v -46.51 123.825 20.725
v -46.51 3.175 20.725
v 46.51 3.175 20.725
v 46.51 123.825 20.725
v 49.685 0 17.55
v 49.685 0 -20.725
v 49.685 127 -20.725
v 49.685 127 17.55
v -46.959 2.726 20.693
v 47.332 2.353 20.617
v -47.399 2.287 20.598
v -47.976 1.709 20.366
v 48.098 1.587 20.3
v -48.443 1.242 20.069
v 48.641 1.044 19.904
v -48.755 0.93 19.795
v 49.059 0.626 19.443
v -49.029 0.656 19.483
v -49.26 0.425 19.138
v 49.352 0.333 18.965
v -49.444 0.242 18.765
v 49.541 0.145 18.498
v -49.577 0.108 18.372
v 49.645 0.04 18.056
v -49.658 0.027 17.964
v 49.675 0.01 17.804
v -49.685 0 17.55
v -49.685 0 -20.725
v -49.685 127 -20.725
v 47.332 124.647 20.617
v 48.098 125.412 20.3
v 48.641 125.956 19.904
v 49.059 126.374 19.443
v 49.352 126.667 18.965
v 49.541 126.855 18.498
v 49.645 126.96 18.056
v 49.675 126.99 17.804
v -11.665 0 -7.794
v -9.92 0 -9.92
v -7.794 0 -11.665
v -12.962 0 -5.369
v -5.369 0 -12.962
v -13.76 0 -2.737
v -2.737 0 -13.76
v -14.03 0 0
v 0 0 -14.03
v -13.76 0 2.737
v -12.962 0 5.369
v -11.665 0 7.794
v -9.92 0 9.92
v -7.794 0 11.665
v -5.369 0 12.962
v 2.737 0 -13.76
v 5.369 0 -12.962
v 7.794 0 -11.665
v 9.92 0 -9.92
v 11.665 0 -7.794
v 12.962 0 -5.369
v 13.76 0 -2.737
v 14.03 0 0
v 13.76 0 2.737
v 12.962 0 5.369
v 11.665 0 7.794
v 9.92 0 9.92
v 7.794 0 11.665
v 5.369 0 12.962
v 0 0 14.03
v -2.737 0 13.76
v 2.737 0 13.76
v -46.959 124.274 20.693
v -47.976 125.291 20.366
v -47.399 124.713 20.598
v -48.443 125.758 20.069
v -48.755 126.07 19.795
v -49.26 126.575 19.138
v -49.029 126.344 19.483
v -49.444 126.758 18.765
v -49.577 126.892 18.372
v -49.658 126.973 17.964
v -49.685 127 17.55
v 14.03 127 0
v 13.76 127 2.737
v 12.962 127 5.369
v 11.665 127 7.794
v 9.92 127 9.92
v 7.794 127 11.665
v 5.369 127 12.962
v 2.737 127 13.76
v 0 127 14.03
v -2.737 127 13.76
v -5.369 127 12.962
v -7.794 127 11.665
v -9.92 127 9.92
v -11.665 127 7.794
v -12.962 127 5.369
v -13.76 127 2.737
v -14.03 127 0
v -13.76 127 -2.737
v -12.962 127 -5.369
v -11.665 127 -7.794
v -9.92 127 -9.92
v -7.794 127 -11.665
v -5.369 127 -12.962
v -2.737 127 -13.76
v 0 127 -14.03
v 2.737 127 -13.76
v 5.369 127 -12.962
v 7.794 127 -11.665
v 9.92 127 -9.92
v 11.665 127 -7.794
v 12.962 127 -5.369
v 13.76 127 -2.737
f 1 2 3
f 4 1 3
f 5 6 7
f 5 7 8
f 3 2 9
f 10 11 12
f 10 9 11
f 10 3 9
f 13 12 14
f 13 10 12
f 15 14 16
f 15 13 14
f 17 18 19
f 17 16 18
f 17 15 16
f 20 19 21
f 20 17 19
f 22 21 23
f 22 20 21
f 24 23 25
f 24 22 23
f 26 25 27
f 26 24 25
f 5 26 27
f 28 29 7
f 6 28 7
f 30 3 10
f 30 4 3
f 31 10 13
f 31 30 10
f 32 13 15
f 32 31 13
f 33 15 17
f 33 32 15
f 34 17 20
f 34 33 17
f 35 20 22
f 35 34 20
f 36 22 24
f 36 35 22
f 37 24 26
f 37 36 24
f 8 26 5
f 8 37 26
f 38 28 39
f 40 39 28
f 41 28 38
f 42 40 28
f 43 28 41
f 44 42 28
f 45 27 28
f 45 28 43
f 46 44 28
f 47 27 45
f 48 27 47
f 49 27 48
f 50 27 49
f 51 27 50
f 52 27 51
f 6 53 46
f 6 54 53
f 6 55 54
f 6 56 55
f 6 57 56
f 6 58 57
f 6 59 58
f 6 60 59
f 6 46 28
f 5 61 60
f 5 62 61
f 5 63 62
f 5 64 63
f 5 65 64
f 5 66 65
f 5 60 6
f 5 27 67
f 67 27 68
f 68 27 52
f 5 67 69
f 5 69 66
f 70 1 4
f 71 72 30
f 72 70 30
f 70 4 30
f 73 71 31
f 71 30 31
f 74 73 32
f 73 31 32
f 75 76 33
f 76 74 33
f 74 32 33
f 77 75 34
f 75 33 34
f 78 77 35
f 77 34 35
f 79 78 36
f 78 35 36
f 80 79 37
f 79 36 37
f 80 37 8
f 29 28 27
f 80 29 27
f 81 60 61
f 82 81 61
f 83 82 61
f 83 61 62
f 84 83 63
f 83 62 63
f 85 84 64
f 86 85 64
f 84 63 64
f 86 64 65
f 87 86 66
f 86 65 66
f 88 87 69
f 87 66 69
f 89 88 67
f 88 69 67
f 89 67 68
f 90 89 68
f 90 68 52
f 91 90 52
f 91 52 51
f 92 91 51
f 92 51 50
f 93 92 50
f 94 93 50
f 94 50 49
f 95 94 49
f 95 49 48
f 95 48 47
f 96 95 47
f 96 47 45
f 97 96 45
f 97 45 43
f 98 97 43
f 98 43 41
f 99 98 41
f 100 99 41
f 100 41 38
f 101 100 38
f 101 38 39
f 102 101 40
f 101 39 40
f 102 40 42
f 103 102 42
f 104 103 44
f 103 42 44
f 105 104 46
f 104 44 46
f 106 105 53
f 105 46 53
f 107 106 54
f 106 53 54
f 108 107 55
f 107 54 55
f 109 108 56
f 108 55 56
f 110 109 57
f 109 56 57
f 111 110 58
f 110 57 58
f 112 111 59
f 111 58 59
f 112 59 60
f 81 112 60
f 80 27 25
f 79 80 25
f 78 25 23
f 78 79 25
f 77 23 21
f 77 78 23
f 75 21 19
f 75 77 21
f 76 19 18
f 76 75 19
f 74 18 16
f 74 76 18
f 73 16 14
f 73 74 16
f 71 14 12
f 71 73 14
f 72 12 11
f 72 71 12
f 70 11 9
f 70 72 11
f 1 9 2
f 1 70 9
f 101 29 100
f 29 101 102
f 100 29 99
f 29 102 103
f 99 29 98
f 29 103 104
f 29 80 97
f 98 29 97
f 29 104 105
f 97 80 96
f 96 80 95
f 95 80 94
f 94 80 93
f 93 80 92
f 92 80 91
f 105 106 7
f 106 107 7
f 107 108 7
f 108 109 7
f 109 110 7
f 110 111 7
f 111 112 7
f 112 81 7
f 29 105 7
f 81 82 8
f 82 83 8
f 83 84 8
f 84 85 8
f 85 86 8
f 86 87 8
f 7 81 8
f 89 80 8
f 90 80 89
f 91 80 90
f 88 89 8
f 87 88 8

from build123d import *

# Parameters (mm, degrees)
F0_W     = 99.370434
F0_H     = 41.450106
F1_DEPTH = 127
F2_R     = 14.029552
F3_DEPTH = 127.001
F4_R     = 3.175


with BuildPart() as f1:
    # F0 (on Front) → F1 (new body)
    with BuildSketch(Plane.XZ):
        Rectangle(F0_W, F0_H)
    extrude(amount=-F1_DEPTH)

    # F2 (on face) → F3 (cut, through all)
    with BuildSketch(Plane.XZ):
        Circle(F2_R)
    extrude(amount=-F3_DEPTH, mode=Mode.SUBTRACT)

    # F4
    f4_edges = [f1.edges().sort_by_distance(p)[0] for p in [
        (49.685217, 63.5, 20.725053),
        (-49.685217, 63.5, 20.725053),
        (0, 0, 20.725053),
        (0, 127, 20.725053),
    ]]
    fillet(f4_edges, radius=F4_R)


solid = f1.part
